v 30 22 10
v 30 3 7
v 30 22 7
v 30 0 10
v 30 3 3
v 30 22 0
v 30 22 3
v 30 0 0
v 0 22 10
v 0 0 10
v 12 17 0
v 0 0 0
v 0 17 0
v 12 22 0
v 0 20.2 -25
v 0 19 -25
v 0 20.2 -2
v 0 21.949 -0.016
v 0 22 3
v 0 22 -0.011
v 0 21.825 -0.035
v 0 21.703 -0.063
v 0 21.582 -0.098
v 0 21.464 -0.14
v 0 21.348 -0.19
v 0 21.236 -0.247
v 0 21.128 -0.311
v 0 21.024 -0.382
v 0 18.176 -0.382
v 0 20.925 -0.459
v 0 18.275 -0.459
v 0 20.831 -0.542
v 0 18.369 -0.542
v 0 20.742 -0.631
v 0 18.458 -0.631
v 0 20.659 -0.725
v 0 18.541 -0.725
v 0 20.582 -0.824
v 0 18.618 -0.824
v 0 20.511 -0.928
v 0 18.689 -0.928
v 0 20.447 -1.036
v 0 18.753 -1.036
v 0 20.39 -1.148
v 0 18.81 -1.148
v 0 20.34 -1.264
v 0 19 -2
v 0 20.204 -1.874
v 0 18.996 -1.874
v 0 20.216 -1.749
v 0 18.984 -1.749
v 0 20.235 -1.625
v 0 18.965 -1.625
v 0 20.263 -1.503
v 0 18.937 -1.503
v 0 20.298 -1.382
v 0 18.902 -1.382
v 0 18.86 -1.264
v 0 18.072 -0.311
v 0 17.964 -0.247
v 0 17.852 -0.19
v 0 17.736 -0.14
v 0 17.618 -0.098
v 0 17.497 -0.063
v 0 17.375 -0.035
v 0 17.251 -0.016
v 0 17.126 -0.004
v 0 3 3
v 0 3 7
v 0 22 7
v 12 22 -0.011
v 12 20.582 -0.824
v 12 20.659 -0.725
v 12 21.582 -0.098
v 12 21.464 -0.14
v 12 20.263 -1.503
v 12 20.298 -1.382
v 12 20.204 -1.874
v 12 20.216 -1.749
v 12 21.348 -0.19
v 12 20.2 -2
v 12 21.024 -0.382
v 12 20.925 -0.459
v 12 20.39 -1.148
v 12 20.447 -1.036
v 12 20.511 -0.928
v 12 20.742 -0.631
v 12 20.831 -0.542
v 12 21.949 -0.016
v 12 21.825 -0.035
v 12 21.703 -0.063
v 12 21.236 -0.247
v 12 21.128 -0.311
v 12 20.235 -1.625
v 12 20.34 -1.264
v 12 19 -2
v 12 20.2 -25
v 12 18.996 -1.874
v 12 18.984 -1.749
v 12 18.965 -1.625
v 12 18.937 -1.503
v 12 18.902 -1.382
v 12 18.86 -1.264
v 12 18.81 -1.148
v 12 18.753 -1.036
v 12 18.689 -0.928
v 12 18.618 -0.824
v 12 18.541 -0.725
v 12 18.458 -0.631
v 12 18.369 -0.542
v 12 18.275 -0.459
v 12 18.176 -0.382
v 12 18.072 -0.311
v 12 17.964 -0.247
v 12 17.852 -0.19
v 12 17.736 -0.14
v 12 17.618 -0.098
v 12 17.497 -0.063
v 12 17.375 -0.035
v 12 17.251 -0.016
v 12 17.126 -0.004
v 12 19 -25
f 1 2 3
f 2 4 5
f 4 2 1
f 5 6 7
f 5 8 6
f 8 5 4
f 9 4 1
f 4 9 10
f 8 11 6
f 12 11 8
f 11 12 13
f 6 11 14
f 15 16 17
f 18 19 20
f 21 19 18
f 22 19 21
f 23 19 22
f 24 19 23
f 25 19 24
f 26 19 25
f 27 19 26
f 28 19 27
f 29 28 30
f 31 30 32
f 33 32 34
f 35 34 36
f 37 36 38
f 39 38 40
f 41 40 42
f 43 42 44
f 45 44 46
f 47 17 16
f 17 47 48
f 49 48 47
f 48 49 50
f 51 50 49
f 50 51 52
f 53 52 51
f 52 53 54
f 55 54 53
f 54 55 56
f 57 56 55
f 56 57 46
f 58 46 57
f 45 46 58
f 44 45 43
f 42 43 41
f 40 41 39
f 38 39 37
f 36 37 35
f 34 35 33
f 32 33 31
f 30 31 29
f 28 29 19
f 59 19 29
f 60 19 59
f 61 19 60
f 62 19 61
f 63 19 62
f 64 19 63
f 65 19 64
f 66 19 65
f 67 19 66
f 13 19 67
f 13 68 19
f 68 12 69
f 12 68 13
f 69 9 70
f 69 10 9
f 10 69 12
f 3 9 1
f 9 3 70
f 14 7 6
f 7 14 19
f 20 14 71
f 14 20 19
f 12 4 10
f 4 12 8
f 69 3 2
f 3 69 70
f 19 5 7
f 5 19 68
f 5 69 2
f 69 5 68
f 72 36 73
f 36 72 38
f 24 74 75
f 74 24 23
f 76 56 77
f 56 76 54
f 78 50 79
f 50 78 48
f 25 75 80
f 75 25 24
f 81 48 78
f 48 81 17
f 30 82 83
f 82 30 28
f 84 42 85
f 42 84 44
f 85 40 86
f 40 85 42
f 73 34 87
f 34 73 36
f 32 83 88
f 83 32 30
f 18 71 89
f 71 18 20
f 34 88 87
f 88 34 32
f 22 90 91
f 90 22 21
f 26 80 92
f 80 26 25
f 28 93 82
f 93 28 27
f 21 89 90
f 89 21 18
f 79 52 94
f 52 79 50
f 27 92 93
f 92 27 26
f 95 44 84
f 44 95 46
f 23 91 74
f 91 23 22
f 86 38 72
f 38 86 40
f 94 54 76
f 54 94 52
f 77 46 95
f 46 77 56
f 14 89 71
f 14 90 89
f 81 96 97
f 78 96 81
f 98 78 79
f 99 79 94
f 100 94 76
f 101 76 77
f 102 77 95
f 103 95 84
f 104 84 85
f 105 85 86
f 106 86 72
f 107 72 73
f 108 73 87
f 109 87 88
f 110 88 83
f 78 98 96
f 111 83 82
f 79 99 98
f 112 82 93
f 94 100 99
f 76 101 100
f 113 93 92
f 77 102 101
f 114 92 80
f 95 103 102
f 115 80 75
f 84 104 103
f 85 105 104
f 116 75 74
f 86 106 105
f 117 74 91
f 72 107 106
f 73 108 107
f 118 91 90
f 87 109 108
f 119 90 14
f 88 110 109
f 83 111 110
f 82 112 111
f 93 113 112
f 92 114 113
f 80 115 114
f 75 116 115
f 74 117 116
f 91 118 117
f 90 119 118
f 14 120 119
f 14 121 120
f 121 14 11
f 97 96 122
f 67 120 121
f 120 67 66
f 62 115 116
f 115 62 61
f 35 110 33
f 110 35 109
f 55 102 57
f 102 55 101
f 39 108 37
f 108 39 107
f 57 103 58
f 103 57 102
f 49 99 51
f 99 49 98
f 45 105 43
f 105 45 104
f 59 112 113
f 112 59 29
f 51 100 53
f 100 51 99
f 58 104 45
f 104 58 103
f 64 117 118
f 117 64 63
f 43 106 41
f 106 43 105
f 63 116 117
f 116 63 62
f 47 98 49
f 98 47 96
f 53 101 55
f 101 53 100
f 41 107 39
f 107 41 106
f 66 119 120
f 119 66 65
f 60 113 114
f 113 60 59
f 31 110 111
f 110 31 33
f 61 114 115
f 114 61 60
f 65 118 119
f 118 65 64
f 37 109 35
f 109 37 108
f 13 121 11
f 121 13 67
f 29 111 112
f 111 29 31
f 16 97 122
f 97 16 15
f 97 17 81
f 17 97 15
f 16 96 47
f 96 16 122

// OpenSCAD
$fn=100;

difference()
{
  cube([30,22,10]);
  translate([0,3,3])
    cube([30,22,4]);
}

  translate([0,20-1,-25])
    cube([12,1.2,25]);

  difference()
    {
        color("blue")
    translate([0,17,-2])
    cube([12,5,2]);
    for (y =[22.2,17.0])
    {
      translate([0,y,-2])
      rotate([0,90,0])
      cylinder(r=2,h=12);
    }
  }
